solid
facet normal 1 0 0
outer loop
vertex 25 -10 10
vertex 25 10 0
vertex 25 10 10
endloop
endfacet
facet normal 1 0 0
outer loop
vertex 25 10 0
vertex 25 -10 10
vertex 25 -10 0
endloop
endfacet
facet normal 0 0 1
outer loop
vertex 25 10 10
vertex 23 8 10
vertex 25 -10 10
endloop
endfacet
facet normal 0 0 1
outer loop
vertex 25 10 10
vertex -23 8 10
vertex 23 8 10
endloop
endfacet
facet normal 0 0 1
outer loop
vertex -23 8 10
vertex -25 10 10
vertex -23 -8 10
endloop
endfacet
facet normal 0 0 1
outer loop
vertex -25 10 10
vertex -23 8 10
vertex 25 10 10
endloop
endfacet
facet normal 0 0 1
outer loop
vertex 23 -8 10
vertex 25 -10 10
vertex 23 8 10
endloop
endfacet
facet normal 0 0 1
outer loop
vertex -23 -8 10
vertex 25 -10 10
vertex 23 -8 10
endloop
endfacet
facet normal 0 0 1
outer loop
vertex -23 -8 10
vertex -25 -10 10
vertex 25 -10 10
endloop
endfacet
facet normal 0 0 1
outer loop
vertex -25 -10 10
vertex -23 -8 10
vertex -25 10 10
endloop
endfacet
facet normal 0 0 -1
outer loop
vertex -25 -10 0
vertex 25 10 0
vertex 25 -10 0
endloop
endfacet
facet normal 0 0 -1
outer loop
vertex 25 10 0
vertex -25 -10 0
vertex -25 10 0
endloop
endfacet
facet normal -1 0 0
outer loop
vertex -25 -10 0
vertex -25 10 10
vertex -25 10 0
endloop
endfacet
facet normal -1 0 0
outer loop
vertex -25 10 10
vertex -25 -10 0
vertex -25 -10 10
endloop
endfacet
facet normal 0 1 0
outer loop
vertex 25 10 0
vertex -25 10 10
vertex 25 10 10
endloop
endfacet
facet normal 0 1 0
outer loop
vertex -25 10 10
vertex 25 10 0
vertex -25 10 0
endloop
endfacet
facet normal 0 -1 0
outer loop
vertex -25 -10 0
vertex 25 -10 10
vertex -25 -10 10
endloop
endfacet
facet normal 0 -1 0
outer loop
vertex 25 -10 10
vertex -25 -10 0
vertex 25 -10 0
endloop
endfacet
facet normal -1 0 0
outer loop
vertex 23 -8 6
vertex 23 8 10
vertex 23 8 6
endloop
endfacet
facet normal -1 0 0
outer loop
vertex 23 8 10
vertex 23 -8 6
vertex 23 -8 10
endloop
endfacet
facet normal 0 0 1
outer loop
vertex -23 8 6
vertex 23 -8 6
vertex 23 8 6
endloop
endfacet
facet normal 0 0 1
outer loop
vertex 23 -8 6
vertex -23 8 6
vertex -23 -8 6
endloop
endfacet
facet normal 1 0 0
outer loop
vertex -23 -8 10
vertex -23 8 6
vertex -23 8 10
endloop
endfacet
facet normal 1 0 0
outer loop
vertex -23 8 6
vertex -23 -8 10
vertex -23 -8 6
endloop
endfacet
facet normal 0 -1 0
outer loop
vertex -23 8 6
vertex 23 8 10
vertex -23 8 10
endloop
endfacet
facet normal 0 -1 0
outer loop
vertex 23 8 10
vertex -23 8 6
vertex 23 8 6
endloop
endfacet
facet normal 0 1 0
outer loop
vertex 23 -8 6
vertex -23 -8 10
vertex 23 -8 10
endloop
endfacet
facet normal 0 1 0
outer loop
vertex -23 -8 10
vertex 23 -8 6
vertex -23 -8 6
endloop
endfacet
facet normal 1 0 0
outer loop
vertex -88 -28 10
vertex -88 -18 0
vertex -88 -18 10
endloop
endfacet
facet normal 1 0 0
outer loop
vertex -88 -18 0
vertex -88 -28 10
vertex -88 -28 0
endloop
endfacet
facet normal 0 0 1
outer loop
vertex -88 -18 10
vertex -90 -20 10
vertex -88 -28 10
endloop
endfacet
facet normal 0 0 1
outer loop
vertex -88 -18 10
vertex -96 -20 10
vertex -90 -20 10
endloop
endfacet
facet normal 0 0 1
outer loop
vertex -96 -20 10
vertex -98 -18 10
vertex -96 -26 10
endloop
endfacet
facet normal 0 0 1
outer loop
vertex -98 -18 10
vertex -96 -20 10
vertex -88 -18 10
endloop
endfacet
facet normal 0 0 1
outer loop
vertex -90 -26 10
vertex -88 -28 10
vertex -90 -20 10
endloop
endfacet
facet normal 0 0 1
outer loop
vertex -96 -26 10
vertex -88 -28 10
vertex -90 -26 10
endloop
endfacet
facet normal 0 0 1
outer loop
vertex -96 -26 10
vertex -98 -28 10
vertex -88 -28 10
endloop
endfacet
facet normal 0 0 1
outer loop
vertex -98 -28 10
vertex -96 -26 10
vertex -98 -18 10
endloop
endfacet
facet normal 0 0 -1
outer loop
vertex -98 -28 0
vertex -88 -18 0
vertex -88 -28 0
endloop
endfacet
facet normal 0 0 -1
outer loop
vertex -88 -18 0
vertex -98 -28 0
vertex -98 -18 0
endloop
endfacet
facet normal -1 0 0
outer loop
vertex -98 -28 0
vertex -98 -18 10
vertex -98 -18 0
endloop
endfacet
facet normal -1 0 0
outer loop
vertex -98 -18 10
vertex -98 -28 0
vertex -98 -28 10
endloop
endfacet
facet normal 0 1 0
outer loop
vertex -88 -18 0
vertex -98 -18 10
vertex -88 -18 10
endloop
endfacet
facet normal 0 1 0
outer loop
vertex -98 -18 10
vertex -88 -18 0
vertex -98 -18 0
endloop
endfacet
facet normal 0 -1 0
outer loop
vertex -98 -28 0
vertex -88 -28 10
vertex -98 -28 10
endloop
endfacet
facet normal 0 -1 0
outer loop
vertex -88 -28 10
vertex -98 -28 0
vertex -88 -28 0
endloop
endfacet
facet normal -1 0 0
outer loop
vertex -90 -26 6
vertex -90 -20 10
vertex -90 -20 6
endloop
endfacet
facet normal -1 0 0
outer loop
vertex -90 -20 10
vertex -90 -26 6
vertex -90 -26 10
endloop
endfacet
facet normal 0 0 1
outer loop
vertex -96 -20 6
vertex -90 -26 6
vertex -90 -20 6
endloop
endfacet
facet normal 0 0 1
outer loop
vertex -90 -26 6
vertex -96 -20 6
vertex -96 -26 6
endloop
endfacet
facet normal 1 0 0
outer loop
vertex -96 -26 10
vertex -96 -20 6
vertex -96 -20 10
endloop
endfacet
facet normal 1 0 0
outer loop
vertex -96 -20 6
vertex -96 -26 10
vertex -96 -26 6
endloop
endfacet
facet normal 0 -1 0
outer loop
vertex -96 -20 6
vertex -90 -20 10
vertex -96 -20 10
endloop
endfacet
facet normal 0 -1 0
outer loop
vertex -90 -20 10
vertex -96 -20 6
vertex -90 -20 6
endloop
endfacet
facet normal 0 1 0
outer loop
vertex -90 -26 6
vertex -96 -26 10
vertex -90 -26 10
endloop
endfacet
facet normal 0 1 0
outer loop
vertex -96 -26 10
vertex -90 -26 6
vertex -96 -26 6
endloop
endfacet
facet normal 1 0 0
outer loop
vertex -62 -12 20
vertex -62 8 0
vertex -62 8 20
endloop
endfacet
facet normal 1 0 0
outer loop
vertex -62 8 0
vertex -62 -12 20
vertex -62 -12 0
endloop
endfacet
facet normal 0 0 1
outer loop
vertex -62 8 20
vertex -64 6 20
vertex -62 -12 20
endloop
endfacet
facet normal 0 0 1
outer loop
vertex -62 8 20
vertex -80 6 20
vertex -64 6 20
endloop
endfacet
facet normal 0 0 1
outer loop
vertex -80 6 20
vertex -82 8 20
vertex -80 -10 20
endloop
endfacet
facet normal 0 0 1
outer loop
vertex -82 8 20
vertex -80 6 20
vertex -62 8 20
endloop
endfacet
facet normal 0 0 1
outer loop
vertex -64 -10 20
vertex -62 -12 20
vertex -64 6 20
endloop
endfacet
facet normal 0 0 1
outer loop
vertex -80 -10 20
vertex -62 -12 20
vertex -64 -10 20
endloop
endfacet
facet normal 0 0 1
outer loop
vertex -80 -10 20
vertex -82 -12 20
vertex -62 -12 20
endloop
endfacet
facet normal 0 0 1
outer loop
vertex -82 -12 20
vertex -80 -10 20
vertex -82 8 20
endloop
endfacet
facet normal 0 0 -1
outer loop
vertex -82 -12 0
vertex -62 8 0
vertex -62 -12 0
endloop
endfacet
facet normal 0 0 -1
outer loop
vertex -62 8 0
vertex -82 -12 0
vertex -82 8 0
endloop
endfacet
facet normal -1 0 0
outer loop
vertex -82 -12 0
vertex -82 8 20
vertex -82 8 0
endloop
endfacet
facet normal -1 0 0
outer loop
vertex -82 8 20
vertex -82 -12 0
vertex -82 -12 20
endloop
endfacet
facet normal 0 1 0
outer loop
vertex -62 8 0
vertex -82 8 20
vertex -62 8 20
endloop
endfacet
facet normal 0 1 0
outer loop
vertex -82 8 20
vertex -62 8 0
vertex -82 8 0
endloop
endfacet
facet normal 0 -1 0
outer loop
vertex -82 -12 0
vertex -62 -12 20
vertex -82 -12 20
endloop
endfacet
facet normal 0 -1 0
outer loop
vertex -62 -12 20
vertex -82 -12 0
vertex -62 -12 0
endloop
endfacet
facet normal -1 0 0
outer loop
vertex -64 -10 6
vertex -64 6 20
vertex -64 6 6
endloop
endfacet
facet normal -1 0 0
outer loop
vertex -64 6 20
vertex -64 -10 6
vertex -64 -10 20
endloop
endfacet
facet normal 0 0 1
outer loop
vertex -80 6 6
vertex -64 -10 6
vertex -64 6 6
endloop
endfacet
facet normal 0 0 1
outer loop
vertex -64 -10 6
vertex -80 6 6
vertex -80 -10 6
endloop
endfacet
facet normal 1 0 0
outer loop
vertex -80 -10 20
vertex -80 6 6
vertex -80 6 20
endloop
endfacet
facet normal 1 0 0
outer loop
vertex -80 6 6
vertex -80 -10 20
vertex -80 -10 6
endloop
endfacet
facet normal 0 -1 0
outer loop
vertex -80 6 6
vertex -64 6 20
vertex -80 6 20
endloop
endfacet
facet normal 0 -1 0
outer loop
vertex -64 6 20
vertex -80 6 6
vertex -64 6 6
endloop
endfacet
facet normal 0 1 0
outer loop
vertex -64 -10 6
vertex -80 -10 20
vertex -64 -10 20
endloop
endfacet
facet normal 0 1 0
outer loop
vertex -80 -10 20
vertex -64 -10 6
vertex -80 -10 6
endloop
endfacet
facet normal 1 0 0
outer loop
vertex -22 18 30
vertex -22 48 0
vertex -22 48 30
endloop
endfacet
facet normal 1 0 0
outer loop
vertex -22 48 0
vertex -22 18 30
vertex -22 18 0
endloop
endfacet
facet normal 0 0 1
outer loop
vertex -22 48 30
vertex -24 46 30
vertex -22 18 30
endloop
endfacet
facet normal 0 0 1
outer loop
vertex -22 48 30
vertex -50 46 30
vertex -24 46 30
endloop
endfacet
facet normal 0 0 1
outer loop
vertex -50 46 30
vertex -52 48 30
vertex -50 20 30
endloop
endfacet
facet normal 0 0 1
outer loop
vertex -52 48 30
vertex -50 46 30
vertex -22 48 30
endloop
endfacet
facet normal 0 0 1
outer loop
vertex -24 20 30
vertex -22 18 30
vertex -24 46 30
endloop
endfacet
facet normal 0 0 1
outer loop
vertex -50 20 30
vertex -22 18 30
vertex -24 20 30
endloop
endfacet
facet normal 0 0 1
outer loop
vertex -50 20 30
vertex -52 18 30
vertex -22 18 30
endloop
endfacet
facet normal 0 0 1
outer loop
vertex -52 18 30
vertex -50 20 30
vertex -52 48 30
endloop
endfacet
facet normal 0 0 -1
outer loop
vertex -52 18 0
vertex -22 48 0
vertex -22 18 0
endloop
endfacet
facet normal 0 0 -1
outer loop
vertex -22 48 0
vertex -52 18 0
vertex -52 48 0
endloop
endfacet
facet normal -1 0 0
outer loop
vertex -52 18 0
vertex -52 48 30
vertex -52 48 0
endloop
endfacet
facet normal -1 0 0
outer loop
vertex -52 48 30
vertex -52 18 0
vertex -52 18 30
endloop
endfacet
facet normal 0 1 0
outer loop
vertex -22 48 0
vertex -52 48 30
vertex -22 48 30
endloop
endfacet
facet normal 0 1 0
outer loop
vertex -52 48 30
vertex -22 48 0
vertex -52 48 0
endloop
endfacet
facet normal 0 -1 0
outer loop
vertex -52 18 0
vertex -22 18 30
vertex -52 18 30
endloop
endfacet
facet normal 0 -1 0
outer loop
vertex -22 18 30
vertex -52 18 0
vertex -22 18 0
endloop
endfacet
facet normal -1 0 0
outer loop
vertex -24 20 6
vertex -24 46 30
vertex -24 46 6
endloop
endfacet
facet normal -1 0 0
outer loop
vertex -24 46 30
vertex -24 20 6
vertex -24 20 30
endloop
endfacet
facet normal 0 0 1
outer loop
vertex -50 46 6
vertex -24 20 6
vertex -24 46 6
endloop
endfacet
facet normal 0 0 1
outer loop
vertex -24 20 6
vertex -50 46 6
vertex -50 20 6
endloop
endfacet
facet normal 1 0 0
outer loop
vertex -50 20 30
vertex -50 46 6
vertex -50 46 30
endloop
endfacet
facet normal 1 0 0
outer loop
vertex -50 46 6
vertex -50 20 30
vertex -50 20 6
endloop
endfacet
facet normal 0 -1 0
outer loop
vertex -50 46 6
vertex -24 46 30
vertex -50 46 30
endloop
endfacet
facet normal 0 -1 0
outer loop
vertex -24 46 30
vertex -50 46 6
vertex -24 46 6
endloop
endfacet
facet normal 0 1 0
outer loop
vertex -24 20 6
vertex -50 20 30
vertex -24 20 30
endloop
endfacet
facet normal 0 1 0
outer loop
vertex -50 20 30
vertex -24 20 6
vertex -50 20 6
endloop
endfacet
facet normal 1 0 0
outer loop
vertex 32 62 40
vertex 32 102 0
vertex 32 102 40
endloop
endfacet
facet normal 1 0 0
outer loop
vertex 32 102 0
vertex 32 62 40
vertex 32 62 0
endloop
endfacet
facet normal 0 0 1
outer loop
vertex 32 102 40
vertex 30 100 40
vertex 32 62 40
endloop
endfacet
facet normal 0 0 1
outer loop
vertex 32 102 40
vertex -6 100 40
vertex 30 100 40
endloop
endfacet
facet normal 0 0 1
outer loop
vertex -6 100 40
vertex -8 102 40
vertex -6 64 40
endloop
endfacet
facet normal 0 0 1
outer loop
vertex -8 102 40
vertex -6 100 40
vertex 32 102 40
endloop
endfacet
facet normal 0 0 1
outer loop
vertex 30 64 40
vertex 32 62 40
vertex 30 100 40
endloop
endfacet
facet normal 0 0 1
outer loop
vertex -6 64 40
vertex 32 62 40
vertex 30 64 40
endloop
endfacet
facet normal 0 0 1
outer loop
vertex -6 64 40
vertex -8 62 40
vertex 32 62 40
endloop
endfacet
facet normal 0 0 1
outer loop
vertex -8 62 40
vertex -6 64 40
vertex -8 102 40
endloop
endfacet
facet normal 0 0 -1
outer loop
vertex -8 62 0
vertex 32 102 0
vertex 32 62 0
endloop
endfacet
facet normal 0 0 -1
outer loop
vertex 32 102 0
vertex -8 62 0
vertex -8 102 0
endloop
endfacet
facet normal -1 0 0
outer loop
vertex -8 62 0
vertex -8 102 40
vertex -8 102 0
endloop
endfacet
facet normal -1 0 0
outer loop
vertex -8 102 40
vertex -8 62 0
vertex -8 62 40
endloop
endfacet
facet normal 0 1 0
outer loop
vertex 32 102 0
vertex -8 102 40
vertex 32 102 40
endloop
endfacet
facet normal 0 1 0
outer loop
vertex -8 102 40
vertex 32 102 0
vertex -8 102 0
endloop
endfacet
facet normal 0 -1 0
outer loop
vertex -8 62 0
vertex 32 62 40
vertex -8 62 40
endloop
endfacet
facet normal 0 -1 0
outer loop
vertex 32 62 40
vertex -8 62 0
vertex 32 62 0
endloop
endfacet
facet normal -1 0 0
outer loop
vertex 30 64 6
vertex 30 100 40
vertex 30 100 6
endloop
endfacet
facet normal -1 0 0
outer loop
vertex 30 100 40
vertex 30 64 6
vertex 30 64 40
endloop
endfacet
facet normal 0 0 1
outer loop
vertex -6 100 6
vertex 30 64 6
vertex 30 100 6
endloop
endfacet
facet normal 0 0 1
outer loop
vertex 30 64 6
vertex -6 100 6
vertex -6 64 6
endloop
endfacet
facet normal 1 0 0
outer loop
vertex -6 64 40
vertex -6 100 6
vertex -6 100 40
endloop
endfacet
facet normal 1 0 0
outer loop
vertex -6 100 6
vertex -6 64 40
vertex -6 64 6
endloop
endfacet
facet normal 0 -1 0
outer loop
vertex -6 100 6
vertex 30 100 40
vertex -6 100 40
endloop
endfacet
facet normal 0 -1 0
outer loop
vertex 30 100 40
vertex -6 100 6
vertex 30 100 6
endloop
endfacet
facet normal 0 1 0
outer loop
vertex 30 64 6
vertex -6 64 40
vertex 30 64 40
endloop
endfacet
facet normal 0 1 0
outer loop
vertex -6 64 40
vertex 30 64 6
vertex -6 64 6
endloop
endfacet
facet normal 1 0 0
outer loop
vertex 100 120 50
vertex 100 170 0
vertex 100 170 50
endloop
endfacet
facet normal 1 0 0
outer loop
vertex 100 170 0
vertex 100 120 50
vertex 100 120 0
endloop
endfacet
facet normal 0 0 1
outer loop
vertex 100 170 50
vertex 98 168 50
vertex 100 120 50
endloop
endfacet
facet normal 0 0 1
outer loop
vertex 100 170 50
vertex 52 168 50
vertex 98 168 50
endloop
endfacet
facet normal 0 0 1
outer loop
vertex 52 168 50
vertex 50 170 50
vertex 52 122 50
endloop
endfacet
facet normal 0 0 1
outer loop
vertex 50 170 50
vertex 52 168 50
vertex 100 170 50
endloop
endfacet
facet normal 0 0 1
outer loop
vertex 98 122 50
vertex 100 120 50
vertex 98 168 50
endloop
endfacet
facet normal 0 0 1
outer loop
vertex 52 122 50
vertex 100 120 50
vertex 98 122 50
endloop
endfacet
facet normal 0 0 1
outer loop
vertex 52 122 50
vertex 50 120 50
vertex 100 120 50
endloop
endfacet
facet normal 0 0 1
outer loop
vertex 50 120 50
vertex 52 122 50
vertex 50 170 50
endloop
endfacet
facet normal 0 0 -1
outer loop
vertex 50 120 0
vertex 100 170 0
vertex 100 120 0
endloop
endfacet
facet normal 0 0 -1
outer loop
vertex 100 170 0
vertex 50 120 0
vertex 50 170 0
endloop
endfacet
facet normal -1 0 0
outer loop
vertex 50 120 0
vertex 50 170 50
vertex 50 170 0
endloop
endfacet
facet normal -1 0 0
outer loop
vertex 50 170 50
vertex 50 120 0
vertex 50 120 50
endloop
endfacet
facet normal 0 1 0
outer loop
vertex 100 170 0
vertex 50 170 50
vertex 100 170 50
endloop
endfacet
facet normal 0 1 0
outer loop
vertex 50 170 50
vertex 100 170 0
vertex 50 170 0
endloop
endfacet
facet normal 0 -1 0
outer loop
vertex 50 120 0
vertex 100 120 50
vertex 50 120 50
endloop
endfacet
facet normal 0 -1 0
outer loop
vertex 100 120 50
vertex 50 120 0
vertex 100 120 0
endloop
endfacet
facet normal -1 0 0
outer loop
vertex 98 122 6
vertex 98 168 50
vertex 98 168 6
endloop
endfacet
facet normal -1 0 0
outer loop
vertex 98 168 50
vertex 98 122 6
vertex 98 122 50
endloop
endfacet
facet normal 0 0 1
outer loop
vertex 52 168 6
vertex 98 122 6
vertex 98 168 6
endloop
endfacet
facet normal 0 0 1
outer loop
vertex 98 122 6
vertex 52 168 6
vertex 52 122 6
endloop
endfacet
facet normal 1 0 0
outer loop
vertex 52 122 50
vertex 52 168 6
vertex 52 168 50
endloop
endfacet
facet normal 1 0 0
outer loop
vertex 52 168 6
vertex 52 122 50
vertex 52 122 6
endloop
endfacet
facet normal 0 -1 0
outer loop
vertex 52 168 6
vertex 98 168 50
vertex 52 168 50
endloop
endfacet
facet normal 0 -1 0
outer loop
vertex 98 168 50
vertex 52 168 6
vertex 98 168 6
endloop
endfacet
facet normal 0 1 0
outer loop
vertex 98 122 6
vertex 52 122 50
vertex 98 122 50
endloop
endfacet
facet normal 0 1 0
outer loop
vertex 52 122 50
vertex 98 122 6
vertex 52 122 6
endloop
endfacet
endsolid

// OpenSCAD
/*

Sage Ridge Robotics OpenSCAD file.
Christopher von Nagy, July 2014.

Example 09 box_of_many_sizes() module. 

*/


// One could quickly build a model of a Roman city using 
// modules. Of course, it would be nice to be able to size
// the construct with some simple parameters. 
// Let's go back to the match_box() module and make a 
// few changes to the module. We'll call the module
// box_of_many_sizes(). See below the module section below.

translate([0,0,0]) 
   box_of_many_sizes(50,20,10);

// We can automate box making with a nested for() loop
base_size_unit = 10;

translate([-100,-30,0]) 
for (i = [1 : 5]){

   assign(
      translation_distance = 
         (0.7 *(i * i * base_size_unit)),
      width = i * base_size_unit,
      length = i * base_size_unit,
      height = i * base_size_unit
   ){
      translate([translation_distance,translation_distance,0]) 
         box_of_many_sizes(
            width,
            length,
            height
         );
   }
}

/*

Define modules

We define larger modules used in code examples above in this section.

These modules include the

   acme_widget22() module
   match_box() module
   box_of_many_sizes()


*/


// The acme_widget_22() module
module acme_widget_22() {
   i = -10;
   difference() {

      union(){
         cylinder(r=2, h=20, center=true);
         translate([0,0,8]) cylinder(r=4,h=2);
         hull () {
            translate([0,0,i]) cylinder(r=2,h=2);
            translate([10,0,i]) cylinder(r=2,h=2);
            translate([5,10,i]) cylinder(r=2,h=2);
         }
      }

      # cylinder(r=1, h=22, center=true);
      # translate([0,0,8]) cylinder(r=2, h=2);
      # translate([10,0,i-1]) cylinder(r=1,h=4);
      # translate([5,10,i-1]) cylinder(r=1,h=4);

   }
}


// The match_box module
module match_box() {
   difference(){
      cube([40,20,10], center=true);
      translate([0,0,1]) cube([38,18,10], center=true);
   }
   translate([-60,100,15]) 
   union(){
      cube([40,20,2], center=true);
      translate(0,0,0) cube([38,18,4], center=true);
   }
}


// The box_of_many_sizes() module
module box_of_many_sizes(

   // sensible default values
   width = 60,
   length = 100,
   height = 40,

)
{

   wall_thickness = 2;

   translate([0,0,height/2])
   difference(){
      cube([width,length,height], center=true);
      translate([0,0,4]) cube([
         width-(2 * wall_thickness),
         length-(2 * wall_thickness),
         height-(2 * wall_thickness)], 
         center=true);

   } 
}

   
/*

License code:

Creative Commons Atribution 4.0

Attribution — You must give appropriate credit, provide a link to the license, and indicate if changes were made. You may do so in any reasonable manner, but not in any way that suggests the licensor endorses you or your use.

No additional restrictions — You may not apply legal terms or technological measures that legally restrict others from doing anything the license permits.


*/
